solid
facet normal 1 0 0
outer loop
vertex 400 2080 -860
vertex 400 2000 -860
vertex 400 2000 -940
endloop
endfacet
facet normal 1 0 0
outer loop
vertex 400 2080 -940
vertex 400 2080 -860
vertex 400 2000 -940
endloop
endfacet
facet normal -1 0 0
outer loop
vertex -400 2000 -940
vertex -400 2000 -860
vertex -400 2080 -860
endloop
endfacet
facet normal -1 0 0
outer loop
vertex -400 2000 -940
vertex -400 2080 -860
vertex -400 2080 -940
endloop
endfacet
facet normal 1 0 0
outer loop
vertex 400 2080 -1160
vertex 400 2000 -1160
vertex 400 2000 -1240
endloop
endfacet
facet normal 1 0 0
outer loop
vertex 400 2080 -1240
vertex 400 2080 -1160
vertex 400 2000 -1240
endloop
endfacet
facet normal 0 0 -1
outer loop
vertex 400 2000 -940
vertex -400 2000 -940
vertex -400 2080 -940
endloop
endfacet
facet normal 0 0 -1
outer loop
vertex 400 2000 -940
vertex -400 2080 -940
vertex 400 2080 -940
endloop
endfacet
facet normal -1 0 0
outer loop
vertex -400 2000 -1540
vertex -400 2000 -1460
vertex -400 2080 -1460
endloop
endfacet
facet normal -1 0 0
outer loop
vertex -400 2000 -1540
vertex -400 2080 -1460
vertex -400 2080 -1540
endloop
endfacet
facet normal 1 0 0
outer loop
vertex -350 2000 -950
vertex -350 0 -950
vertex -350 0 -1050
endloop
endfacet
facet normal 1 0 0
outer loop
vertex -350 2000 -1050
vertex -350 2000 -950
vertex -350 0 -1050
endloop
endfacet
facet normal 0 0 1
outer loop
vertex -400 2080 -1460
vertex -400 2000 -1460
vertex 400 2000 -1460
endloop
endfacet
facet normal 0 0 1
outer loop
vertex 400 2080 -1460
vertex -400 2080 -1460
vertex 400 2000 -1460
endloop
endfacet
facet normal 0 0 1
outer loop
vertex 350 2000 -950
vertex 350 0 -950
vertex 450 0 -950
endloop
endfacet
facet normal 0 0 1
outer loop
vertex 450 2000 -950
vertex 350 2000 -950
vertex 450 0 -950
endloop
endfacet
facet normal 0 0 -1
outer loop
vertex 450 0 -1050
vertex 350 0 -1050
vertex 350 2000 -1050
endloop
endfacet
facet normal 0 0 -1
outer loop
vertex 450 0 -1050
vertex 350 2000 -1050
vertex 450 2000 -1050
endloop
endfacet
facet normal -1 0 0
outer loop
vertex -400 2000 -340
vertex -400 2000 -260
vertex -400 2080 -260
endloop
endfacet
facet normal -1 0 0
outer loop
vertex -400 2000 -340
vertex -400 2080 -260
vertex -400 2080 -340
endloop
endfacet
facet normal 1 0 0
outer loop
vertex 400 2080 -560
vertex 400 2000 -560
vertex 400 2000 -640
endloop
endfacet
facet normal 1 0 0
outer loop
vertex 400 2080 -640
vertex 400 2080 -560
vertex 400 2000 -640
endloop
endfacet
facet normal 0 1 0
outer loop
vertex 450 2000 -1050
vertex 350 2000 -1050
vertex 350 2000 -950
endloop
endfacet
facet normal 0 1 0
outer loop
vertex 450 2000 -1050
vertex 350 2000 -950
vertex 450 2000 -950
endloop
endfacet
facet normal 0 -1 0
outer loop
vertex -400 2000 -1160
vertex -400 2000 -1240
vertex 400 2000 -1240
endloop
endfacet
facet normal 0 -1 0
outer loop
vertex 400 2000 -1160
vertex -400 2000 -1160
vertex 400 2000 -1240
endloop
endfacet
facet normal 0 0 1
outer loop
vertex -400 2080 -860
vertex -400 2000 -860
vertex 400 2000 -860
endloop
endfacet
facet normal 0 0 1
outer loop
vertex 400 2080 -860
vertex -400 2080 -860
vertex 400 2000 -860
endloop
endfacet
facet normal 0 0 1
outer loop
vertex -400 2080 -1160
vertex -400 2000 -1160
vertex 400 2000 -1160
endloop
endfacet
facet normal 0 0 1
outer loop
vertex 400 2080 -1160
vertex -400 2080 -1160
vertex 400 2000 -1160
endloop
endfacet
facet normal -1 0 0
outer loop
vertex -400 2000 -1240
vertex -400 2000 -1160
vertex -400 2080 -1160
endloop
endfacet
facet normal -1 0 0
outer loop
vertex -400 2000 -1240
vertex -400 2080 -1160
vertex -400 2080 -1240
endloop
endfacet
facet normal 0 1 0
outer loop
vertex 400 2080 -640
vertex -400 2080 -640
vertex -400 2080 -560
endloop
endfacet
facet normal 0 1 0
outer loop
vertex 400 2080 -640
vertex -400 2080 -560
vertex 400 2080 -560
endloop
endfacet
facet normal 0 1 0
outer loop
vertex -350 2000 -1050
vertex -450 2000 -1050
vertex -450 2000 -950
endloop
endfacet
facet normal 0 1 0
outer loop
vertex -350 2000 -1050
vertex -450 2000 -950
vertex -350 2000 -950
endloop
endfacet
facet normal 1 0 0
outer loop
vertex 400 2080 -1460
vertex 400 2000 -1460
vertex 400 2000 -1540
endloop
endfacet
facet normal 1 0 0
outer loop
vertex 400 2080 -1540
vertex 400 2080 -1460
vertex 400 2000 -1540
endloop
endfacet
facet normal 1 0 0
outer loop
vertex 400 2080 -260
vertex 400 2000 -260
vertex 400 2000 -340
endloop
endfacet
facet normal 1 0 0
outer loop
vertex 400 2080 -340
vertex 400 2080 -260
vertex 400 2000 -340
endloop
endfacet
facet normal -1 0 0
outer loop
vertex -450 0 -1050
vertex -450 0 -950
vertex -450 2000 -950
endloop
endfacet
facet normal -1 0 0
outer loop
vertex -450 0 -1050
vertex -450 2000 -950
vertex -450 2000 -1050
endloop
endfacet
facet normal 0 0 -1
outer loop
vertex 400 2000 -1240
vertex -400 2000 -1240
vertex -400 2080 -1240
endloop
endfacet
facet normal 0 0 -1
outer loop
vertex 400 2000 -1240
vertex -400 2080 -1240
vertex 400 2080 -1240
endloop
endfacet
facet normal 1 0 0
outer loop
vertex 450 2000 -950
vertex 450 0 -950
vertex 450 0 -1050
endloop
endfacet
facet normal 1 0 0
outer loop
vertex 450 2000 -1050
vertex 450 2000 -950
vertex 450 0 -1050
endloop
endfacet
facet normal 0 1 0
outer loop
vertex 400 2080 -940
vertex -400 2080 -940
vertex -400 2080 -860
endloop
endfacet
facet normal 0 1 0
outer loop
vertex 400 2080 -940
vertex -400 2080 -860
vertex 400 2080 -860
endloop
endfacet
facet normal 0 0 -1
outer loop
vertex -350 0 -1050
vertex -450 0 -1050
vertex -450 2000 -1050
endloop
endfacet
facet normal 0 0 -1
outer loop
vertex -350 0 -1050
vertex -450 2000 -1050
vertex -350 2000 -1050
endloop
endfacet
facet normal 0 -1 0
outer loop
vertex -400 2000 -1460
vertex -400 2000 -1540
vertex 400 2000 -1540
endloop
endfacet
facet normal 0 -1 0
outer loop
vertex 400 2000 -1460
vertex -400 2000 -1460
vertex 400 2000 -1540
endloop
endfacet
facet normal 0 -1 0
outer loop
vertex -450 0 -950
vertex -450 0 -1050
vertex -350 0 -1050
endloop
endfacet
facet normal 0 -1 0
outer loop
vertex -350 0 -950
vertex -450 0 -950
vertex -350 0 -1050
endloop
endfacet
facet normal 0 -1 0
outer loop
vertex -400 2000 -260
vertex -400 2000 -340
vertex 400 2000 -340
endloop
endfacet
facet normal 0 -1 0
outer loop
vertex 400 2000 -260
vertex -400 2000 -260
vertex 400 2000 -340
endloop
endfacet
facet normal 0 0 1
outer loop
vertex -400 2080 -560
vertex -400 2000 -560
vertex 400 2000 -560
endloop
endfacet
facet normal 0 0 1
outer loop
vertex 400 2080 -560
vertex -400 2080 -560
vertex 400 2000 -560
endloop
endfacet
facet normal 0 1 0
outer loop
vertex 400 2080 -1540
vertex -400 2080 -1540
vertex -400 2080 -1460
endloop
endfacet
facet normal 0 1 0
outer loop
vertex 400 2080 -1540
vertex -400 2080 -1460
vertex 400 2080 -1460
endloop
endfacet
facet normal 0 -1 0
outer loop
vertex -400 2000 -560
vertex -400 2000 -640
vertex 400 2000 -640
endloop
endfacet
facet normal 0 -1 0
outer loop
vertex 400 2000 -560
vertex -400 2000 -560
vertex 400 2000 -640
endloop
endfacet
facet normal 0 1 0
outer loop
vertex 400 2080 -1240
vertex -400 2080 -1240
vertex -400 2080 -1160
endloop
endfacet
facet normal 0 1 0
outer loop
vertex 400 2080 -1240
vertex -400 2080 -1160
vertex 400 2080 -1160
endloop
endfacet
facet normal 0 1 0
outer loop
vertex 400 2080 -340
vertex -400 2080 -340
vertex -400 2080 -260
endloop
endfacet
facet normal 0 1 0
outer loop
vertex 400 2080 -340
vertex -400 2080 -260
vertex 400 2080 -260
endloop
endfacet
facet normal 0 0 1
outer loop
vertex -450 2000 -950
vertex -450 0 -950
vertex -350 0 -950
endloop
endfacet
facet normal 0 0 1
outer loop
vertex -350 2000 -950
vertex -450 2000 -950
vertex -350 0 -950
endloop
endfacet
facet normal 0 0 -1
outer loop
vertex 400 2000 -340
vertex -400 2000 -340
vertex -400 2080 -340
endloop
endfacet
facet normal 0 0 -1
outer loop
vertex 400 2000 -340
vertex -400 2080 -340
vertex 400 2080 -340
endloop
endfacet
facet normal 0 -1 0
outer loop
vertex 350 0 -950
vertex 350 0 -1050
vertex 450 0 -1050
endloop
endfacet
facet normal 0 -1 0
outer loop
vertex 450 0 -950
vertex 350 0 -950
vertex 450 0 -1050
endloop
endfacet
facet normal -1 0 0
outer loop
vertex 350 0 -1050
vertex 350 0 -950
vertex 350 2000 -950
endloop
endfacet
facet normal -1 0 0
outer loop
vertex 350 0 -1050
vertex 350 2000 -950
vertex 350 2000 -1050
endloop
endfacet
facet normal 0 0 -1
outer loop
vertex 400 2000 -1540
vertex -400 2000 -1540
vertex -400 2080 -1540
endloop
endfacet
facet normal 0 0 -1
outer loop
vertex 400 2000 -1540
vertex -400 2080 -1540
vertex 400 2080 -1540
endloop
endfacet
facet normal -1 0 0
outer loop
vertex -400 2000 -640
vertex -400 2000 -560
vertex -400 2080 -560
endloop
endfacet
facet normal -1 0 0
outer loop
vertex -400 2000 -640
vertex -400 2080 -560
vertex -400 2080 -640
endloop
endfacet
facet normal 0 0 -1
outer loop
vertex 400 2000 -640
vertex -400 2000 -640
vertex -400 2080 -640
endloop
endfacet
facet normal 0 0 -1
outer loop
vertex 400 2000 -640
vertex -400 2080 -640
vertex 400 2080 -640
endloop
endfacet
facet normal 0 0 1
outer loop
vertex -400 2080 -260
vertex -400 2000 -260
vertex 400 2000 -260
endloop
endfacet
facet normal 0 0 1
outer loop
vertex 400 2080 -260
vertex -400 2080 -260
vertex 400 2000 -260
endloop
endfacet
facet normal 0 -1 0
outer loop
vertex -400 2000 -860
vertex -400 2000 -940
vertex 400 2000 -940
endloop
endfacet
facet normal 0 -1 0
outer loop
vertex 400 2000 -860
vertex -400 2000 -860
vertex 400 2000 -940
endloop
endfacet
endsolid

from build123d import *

# Parameters (mm, degrees)
SKETCH_1_W      = 100
SKETCH_1_H      = 100
EXTRUDE_1_DEPTH = 2000
SKETCH_2_W      = 100
SKETCH_2_H      = 100
EXTRUDE_2_DEPTH = 2000
SKETCH_3_W      = 800
SKETCH_3_H      = 80
EXTRUDE_3_DEPTH = 80
SKETCH_4_W      = 800
SKETCH_4_H      = 80
EXTRUDE_4_DEPTH = 80
SKETCH_5_W      = 800
SKETCH_5_H      = 80
EXTRUDE_5_DEPTH = 80
SKETCH_6_W      = 800
SKETCH_6_H      = 80
EXTRUDE_6_DEPTH = 80
SKETCH_7_W      = 800
SKETCH_7_H      = 80
EXTRUDE_7_DEPTH = 80


with BuildPart() as part:
    # 草图1 → 凸台-拉伸1 (new body)
    with BuildSketch(Plane(origin=(0, 0, 0), x_dir=(1, 0, 0), z_dir=(0, 1, 0))):
        with Locations((-400, 1000)):
            Rectangle(SKETCH_1_W, SKETCH_1_H)
    extrude(amount=EXTRUDE_1_DEPTH)


with BuildPart() as body_2:
    # 草图2 → 凸台-拉伸2 (new body)
    with BuildSketch(Plane(origin=(0, 0, 0), x_dir=(1, 0, 0), z_dir=(0, 1, 0))):
        with Locations((400, 1000)):
            Rectangle(SKETCH_2_W, SKETCH_2_H)
    extrude(amount=EXTRUDE_2_DEPTH)


with BuildPart() as body_3:
    # 草图3 → 凸台-拉伸3 (new body)
    with BuildSketch(Plane(origin=(0, 2000, 0), x_dir=(1, 0, 0), z_dir=(0, 1, 0))):
        with Locations((0, 300)):
            Rectangle(SKETCH_3_W, SKETCH_3_H)
    extrude(amount=EXTRUDE_3_DEPTH)


with BuildPart() as body_4:
    # 草图4 → 凸台-拉伸4 (new body)
    with BuildSketch(Plane(origin=(0, 2000, 0), x_dir=(1, 0, 0), z_dir=(0, 1, 0))):
        with Locations((0, 600)):
            Rectangle(SKETCH_4_W, SKETCH_4_H)
    extrude(amount=EXTRUDE_4_DEPTH)


with BuildPart() as body_5:
    # 草图5 → 凸台-拉伸5 (new body)
    with BuildSketch(Plane(origin=(0, 2000, 0), x_dir=(1, 0, 0), z_dir=(0, 1, 0))):
        with Locations((0, 900)):
            Rectangle(SKETCH_5_W, SKETCH_5_H)
    extrude(amount=EXTRUDE_5_DEPTH)


with BuildPart() as body_6:
    # 草图6 → 凸台-拉伸6 (new body)
    with BuildSketch(Plane(origin=(0, 2000, 0), x_dir=(1, 0, 0), z_dir=(0, 1, 0))):
        with Locations((0, 1200)):
            Rectangle(SKETCH_6_W, SKETCH_6_H)
    extrude(amount=EXTRUDE_6_DEPTH)


with BuildPart() as body_7:
    # 草图7 → 凸台-拉伸7 (new body)
    with BuildSketch(Plane(origin=(0, 2000, 0), x_dir=(1, 0, 0), z_dir=(0, 1, 0))):
        with Locations((0, 1500)):
            Rectangle(SKETCH_7_W, SKETCH_7_H)
    extrude(amount=EXTRUDE_7_DEPTH)


solid = Compound([part.part, body_2.part, body_3.part, body_4.part, body_5.part, body_6.part, body_7.part])
